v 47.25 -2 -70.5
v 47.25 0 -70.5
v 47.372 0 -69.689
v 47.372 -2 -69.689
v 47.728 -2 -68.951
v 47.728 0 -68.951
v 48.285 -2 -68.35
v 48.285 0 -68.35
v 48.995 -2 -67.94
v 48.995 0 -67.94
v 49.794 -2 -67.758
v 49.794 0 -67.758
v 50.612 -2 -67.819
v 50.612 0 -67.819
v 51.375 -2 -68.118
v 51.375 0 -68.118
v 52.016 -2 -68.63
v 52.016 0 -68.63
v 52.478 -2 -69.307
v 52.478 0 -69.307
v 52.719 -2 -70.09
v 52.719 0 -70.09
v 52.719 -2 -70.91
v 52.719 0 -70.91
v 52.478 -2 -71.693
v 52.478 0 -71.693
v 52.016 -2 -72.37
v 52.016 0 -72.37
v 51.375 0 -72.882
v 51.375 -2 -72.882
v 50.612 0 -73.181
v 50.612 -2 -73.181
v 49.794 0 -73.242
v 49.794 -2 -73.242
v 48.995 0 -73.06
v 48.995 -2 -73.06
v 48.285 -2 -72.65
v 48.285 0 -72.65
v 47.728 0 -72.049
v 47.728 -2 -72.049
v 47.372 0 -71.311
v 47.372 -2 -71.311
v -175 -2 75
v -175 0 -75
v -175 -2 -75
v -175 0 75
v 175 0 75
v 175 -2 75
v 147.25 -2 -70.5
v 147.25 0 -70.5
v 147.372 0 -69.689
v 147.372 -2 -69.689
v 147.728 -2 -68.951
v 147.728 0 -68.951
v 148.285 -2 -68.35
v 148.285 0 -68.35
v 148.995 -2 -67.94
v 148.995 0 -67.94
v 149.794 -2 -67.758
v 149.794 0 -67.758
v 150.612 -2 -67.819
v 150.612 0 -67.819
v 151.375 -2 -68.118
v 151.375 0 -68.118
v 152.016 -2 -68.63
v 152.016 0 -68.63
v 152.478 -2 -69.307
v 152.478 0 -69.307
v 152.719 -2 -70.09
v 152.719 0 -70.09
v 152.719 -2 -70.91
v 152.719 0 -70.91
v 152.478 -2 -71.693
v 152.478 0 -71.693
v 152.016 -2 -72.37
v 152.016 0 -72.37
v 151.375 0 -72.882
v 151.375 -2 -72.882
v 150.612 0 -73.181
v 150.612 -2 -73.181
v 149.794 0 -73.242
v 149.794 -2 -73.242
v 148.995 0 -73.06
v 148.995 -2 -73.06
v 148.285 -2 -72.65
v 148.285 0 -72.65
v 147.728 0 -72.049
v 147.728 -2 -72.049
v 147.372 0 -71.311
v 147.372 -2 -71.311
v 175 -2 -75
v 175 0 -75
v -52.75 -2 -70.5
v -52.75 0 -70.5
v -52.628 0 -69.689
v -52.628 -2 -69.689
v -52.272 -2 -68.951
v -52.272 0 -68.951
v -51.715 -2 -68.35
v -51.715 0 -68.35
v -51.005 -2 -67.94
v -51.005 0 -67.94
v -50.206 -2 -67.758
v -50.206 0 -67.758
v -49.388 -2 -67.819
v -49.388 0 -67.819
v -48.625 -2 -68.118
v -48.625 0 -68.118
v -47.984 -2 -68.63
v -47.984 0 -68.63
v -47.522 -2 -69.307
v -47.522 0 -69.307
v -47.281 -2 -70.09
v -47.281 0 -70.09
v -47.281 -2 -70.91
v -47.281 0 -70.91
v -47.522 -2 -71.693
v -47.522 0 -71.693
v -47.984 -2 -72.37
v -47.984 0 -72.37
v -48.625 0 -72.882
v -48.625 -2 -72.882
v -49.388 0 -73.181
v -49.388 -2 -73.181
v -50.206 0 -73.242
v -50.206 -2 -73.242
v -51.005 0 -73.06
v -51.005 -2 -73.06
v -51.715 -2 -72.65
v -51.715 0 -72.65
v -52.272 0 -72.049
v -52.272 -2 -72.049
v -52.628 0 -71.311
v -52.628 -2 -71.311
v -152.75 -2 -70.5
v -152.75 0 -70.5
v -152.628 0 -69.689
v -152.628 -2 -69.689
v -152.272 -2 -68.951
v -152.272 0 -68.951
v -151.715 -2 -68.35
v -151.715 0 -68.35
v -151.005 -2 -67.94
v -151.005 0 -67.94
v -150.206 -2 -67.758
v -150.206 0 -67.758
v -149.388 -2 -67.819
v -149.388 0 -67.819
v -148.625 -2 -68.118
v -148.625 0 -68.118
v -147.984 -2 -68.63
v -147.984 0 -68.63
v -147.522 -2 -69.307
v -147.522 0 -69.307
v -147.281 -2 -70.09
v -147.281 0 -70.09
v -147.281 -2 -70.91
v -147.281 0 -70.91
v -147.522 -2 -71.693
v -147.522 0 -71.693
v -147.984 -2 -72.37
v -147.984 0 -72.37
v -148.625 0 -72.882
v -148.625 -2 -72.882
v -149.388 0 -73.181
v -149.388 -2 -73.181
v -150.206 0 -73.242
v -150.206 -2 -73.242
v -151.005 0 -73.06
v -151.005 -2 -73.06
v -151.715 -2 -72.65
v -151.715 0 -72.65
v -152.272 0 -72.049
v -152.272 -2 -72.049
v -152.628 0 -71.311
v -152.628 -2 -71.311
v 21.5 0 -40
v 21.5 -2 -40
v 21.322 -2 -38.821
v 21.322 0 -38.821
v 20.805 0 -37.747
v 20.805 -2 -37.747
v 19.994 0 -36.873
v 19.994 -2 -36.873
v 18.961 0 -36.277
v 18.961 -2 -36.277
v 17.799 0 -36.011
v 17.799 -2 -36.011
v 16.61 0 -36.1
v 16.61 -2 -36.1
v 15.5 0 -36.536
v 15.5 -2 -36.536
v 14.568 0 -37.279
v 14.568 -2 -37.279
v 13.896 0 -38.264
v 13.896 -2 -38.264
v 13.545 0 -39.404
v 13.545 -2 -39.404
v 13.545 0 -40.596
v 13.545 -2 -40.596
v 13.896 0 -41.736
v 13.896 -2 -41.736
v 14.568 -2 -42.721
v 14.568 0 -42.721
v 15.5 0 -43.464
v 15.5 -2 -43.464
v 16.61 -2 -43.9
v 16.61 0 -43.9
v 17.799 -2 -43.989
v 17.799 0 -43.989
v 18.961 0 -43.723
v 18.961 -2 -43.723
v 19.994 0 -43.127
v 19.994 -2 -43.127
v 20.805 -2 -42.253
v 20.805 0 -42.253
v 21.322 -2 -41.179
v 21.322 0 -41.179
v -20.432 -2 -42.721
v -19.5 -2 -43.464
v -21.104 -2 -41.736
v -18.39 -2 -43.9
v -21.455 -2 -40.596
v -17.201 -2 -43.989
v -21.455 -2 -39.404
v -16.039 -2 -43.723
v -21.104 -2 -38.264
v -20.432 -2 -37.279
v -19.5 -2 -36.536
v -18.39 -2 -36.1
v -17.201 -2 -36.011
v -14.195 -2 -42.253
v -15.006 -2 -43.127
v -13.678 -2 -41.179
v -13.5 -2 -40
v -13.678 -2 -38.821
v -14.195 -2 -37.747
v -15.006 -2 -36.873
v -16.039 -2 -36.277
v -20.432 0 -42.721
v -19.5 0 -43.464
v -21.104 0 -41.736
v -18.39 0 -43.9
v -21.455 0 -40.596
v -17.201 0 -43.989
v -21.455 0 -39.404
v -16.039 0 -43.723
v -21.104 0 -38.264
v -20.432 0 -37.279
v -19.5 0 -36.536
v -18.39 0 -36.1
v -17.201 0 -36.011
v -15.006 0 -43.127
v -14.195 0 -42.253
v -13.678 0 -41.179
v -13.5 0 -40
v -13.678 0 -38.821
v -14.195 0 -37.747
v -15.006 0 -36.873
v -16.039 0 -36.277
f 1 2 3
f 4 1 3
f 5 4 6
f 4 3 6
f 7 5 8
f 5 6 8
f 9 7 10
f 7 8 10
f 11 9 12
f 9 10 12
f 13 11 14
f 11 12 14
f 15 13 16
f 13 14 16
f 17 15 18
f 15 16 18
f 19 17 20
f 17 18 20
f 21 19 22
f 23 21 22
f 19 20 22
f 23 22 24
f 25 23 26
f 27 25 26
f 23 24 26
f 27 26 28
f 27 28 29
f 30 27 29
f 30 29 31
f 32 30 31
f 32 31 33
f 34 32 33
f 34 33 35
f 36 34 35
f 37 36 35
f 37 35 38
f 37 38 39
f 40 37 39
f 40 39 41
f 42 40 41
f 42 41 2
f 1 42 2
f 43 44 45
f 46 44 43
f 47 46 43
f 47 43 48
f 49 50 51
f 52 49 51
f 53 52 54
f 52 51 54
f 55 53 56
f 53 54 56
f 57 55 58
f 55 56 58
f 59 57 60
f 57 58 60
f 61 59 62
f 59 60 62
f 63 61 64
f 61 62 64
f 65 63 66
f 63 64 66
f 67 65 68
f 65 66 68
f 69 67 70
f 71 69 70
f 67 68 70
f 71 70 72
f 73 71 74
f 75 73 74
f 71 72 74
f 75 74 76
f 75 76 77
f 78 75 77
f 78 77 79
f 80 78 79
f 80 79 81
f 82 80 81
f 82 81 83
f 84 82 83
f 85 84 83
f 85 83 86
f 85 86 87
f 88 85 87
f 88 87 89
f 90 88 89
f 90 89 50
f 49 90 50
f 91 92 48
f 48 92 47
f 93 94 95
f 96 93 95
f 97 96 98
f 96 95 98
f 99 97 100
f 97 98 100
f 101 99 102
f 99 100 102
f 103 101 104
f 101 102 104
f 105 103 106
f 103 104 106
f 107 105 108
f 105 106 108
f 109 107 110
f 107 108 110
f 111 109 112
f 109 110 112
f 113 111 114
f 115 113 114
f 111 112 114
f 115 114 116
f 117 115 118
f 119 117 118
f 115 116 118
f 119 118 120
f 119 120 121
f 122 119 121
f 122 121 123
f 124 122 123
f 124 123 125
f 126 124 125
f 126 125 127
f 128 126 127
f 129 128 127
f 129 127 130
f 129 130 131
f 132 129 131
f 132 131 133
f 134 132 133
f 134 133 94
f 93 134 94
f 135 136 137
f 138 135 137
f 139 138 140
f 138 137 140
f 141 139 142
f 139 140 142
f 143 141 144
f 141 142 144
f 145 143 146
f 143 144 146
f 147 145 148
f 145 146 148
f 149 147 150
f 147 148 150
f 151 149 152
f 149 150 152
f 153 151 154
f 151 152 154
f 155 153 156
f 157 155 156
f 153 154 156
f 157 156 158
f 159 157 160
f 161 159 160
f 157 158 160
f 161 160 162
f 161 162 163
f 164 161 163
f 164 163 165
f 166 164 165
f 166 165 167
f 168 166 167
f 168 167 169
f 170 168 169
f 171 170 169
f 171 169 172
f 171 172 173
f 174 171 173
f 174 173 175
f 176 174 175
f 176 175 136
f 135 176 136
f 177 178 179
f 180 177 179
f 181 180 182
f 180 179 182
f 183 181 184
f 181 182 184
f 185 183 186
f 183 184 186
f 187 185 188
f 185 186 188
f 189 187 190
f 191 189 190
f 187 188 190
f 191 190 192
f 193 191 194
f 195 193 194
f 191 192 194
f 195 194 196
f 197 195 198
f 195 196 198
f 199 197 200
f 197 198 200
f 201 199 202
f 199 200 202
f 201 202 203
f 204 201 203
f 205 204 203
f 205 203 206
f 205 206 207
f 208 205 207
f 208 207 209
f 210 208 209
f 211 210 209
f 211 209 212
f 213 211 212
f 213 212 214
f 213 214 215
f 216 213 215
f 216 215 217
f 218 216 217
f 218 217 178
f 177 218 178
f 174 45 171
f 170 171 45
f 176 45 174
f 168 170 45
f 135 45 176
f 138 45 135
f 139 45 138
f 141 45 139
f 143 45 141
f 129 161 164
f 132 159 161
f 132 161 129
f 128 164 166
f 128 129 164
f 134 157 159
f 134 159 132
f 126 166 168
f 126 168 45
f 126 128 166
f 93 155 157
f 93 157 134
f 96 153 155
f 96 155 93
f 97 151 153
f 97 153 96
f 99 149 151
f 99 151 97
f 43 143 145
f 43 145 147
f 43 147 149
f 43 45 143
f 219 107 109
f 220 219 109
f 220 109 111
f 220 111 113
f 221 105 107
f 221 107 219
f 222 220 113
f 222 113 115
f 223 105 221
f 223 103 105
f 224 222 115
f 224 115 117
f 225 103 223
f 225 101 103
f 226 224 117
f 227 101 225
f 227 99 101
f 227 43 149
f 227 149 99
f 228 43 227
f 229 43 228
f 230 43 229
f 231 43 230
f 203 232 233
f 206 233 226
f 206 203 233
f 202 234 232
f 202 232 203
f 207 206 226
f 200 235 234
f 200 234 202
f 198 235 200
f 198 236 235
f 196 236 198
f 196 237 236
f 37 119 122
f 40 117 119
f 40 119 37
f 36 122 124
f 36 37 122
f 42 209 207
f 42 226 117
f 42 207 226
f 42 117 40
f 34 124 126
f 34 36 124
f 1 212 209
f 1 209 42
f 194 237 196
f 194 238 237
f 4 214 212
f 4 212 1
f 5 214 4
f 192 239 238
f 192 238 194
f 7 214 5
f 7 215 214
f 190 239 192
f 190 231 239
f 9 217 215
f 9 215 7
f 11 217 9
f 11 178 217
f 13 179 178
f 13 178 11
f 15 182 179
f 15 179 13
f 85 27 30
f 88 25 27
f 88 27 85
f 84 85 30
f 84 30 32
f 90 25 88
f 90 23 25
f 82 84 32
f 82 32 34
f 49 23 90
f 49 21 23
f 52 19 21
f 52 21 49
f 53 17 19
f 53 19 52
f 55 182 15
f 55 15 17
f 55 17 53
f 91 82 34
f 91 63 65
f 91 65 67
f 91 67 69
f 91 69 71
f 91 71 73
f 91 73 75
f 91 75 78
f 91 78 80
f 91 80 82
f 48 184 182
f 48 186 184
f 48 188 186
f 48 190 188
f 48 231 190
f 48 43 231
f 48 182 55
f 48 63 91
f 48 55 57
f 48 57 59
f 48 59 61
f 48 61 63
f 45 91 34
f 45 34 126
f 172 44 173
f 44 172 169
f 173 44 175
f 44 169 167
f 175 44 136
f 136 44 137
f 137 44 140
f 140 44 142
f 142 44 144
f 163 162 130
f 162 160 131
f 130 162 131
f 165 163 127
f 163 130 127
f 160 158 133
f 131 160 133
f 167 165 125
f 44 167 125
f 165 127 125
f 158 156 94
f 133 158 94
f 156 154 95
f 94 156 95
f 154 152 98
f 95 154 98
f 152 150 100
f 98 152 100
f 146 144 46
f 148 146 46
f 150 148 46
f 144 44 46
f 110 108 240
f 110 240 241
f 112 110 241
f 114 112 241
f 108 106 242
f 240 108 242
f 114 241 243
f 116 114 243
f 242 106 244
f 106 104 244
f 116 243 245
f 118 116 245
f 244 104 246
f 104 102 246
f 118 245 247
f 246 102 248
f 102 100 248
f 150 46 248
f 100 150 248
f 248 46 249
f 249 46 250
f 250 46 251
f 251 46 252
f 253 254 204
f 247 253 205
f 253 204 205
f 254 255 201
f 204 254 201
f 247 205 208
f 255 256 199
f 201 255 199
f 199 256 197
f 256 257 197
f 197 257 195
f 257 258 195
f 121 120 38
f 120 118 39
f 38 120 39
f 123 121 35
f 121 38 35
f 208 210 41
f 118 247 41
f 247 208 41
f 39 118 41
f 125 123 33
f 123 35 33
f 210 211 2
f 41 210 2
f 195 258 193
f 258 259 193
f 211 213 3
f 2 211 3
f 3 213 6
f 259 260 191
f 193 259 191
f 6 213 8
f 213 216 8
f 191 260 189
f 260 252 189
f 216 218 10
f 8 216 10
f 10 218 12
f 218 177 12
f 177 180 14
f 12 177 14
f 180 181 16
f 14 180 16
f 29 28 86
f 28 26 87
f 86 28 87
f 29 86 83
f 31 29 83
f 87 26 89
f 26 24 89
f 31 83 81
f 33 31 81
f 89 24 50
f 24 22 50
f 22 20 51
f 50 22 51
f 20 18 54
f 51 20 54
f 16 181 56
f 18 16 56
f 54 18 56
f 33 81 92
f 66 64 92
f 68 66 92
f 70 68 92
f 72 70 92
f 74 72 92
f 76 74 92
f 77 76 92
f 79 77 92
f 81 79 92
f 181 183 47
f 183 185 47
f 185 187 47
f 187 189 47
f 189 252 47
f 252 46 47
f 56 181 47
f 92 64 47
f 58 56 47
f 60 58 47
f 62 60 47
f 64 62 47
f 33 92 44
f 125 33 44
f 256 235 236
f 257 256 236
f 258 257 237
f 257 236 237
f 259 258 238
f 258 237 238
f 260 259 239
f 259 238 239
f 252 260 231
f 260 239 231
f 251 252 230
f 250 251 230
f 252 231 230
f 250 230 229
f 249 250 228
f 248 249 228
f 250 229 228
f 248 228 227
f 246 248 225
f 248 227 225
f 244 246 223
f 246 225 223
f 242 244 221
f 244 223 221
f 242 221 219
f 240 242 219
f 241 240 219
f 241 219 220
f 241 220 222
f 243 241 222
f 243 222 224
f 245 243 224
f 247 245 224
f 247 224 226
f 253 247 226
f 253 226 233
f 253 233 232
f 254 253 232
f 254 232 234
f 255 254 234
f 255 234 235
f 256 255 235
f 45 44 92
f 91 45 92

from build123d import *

# Parameters (mm, degrees)
F0_W     = 350
F0_H     = 150
F1_DEPTH = 2
F2_R     = 4
F3_DEPTH = 25
F5_D     = 5.5
F5_DEPTH = 13
F5_TIP   = 1.6523667023


with BuildPart() as f1:
    # F0 (on Front) → F1 (new body)
    with BuildSketch(Plane.XZ):
        Rectangle(F0_W, F0_H)
    extrude(amount=F1_DEPTH)

    # F2 (on face) → F3 (cut)
    with BuildSketch(Plane.XZ.offset(2)):
        with Locations((-17.5, -40)):
            Circle(F2_R)
        with Locations((17.5, -40)):
            Circle(F2_R)
    extrude(amount=-F3_DEPTH, mode=Mode.SUBTRACT)

    # F5
    with Locations(Plane.XZ.offset(2)):
        with Locations((-150, -70.5), (-50, -70.5), (50, -70.5), (150, -70.5)):
            Hole(F5_D / 2, depth=F5_DEPTH)
            with Locations((0, 0, -(F5_DEPTH + F5_TIP / 2))):  # 118° drill point
                Cone(0, F5_D / 2, F5_TIP, mode=Mode.SUBTRACT)


solid = f1.part
